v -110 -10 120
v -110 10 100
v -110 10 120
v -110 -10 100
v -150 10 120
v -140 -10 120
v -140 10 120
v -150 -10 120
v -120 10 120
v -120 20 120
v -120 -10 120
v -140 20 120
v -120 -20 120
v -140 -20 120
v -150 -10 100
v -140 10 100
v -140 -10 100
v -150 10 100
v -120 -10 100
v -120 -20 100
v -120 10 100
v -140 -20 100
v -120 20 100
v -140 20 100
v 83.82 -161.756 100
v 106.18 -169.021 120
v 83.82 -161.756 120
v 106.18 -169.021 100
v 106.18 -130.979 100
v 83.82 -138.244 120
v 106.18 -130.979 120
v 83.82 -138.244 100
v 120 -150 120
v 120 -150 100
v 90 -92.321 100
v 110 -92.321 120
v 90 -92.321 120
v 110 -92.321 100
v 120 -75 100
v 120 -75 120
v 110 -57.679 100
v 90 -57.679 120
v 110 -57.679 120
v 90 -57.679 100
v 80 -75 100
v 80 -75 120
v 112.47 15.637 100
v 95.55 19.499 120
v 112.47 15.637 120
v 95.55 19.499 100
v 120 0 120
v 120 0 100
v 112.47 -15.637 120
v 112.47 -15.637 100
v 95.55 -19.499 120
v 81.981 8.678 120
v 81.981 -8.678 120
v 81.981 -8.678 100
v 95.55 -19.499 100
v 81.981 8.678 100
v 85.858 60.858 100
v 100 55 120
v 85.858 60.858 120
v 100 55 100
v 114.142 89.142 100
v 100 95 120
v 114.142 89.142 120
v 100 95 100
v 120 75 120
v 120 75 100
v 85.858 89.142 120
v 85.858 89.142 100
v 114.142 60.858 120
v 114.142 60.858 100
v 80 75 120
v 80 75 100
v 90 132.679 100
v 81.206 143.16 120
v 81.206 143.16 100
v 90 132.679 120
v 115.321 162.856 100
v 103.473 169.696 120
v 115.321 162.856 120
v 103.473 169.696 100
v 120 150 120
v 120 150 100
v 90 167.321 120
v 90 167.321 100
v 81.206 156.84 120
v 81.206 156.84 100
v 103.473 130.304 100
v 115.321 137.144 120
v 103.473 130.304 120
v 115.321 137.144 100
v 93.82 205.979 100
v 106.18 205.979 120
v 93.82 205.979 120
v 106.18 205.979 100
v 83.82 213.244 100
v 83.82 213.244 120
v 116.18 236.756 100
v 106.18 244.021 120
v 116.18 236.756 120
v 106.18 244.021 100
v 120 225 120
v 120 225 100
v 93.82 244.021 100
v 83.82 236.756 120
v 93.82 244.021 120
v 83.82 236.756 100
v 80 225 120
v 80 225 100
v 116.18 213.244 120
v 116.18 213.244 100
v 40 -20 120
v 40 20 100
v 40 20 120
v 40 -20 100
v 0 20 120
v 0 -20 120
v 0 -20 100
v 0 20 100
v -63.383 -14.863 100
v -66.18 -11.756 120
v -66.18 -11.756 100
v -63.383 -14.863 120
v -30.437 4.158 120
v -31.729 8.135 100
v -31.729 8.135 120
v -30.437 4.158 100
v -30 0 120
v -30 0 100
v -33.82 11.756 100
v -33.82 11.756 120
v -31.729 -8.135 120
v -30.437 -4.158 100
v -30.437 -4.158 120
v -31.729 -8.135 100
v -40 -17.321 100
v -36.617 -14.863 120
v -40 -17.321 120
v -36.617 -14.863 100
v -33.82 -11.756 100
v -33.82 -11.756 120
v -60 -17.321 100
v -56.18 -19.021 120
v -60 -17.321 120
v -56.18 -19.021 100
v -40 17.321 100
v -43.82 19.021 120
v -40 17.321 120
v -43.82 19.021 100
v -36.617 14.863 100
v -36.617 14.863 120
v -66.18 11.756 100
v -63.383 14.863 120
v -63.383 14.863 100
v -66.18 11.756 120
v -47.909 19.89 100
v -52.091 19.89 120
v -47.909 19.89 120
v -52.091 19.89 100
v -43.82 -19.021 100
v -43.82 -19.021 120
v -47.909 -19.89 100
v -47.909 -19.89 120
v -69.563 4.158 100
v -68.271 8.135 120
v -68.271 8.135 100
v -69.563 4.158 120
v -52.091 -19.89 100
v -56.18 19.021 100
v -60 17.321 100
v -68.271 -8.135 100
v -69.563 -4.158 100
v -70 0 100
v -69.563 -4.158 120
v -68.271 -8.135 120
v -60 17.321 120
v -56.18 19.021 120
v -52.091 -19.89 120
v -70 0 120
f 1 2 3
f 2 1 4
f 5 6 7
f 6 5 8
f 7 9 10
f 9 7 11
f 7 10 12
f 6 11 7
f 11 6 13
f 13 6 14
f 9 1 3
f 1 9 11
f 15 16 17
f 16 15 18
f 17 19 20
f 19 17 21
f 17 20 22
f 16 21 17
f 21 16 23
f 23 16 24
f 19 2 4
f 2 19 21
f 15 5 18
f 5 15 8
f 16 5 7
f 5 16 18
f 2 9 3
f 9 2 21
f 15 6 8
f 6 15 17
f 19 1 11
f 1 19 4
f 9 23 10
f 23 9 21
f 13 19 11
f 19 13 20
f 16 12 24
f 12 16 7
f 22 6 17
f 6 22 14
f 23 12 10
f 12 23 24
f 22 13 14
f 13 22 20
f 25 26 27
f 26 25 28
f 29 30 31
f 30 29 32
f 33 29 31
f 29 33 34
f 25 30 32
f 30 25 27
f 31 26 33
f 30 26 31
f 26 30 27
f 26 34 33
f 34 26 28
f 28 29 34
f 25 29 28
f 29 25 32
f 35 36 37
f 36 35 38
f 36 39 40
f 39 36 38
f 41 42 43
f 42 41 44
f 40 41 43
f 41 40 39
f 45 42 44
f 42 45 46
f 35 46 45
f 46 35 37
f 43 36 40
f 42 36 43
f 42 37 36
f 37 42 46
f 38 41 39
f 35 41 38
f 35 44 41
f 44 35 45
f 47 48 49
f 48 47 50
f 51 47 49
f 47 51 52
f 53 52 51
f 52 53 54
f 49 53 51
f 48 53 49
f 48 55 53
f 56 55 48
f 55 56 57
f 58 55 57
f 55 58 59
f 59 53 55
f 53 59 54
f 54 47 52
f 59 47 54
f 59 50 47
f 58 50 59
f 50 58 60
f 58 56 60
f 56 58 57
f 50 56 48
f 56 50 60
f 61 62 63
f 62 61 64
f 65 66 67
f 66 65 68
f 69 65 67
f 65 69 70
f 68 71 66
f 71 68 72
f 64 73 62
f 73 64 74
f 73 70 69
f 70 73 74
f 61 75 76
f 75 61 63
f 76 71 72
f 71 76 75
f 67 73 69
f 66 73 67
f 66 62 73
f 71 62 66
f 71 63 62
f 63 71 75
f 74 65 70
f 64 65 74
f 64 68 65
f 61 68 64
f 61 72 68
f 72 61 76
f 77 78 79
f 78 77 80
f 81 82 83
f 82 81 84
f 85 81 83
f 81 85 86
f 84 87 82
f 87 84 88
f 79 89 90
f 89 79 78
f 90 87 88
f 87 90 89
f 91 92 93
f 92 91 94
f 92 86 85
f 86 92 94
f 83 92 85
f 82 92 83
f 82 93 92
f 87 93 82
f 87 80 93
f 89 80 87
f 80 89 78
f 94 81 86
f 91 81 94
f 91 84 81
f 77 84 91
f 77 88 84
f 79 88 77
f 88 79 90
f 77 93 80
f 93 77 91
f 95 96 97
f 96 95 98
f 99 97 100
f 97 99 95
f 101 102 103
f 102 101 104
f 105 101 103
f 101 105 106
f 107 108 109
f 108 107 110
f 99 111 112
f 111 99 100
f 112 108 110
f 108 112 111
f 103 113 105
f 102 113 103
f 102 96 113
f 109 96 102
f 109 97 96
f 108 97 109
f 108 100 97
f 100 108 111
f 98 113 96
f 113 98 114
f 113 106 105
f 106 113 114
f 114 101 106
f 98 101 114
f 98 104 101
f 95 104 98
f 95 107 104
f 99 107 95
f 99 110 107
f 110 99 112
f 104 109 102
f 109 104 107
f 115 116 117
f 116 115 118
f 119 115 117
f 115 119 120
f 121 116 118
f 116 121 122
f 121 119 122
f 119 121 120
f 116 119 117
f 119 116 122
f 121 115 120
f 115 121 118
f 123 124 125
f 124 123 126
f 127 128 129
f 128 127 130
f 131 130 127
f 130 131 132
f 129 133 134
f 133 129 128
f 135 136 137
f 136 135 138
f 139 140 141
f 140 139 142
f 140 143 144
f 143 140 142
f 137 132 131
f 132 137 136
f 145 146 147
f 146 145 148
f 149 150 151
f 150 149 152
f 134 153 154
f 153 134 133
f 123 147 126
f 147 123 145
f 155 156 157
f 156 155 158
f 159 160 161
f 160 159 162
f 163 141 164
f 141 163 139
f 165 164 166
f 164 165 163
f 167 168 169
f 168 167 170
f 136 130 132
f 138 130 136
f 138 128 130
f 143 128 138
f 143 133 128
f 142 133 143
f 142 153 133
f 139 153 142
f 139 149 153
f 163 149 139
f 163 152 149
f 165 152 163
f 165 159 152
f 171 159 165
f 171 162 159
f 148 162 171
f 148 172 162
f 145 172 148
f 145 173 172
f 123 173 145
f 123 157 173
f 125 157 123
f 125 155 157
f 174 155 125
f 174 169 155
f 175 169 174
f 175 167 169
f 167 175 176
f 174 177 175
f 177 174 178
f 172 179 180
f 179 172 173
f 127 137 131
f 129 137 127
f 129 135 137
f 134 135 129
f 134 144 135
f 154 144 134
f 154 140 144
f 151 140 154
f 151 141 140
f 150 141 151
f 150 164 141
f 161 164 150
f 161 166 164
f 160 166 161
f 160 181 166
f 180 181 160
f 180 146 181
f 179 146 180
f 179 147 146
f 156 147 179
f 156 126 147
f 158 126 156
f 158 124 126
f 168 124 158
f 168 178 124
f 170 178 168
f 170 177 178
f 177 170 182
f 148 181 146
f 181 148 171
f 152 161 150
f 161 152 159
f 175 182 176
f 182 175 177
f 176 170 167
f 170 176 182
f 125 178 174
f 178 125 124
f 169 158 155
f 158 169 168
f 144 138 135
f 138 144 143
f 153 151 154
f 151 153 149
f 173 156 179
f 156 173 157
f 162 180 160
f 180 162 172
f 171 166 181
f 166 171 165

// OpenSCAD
// generate various floating objects to generate support under

float_height = 100;

translate([0, -20, float_height])
cube([40, 40, 20]);

translate([-50, 0, float_height])
cylinder(r=20, h=20);

translate([-150, -20, float_height])
union() {
translate([0, 10, 0])
cube([40, 20, 20]);

translate([10, 0, 0])
cube([20, 40, 20]);
}

for(i=[5:10]) {
  translate([100, -150 + 75 * (i-5), float_height])
  cylinder(r=20, h=20, $fn=i);
}
